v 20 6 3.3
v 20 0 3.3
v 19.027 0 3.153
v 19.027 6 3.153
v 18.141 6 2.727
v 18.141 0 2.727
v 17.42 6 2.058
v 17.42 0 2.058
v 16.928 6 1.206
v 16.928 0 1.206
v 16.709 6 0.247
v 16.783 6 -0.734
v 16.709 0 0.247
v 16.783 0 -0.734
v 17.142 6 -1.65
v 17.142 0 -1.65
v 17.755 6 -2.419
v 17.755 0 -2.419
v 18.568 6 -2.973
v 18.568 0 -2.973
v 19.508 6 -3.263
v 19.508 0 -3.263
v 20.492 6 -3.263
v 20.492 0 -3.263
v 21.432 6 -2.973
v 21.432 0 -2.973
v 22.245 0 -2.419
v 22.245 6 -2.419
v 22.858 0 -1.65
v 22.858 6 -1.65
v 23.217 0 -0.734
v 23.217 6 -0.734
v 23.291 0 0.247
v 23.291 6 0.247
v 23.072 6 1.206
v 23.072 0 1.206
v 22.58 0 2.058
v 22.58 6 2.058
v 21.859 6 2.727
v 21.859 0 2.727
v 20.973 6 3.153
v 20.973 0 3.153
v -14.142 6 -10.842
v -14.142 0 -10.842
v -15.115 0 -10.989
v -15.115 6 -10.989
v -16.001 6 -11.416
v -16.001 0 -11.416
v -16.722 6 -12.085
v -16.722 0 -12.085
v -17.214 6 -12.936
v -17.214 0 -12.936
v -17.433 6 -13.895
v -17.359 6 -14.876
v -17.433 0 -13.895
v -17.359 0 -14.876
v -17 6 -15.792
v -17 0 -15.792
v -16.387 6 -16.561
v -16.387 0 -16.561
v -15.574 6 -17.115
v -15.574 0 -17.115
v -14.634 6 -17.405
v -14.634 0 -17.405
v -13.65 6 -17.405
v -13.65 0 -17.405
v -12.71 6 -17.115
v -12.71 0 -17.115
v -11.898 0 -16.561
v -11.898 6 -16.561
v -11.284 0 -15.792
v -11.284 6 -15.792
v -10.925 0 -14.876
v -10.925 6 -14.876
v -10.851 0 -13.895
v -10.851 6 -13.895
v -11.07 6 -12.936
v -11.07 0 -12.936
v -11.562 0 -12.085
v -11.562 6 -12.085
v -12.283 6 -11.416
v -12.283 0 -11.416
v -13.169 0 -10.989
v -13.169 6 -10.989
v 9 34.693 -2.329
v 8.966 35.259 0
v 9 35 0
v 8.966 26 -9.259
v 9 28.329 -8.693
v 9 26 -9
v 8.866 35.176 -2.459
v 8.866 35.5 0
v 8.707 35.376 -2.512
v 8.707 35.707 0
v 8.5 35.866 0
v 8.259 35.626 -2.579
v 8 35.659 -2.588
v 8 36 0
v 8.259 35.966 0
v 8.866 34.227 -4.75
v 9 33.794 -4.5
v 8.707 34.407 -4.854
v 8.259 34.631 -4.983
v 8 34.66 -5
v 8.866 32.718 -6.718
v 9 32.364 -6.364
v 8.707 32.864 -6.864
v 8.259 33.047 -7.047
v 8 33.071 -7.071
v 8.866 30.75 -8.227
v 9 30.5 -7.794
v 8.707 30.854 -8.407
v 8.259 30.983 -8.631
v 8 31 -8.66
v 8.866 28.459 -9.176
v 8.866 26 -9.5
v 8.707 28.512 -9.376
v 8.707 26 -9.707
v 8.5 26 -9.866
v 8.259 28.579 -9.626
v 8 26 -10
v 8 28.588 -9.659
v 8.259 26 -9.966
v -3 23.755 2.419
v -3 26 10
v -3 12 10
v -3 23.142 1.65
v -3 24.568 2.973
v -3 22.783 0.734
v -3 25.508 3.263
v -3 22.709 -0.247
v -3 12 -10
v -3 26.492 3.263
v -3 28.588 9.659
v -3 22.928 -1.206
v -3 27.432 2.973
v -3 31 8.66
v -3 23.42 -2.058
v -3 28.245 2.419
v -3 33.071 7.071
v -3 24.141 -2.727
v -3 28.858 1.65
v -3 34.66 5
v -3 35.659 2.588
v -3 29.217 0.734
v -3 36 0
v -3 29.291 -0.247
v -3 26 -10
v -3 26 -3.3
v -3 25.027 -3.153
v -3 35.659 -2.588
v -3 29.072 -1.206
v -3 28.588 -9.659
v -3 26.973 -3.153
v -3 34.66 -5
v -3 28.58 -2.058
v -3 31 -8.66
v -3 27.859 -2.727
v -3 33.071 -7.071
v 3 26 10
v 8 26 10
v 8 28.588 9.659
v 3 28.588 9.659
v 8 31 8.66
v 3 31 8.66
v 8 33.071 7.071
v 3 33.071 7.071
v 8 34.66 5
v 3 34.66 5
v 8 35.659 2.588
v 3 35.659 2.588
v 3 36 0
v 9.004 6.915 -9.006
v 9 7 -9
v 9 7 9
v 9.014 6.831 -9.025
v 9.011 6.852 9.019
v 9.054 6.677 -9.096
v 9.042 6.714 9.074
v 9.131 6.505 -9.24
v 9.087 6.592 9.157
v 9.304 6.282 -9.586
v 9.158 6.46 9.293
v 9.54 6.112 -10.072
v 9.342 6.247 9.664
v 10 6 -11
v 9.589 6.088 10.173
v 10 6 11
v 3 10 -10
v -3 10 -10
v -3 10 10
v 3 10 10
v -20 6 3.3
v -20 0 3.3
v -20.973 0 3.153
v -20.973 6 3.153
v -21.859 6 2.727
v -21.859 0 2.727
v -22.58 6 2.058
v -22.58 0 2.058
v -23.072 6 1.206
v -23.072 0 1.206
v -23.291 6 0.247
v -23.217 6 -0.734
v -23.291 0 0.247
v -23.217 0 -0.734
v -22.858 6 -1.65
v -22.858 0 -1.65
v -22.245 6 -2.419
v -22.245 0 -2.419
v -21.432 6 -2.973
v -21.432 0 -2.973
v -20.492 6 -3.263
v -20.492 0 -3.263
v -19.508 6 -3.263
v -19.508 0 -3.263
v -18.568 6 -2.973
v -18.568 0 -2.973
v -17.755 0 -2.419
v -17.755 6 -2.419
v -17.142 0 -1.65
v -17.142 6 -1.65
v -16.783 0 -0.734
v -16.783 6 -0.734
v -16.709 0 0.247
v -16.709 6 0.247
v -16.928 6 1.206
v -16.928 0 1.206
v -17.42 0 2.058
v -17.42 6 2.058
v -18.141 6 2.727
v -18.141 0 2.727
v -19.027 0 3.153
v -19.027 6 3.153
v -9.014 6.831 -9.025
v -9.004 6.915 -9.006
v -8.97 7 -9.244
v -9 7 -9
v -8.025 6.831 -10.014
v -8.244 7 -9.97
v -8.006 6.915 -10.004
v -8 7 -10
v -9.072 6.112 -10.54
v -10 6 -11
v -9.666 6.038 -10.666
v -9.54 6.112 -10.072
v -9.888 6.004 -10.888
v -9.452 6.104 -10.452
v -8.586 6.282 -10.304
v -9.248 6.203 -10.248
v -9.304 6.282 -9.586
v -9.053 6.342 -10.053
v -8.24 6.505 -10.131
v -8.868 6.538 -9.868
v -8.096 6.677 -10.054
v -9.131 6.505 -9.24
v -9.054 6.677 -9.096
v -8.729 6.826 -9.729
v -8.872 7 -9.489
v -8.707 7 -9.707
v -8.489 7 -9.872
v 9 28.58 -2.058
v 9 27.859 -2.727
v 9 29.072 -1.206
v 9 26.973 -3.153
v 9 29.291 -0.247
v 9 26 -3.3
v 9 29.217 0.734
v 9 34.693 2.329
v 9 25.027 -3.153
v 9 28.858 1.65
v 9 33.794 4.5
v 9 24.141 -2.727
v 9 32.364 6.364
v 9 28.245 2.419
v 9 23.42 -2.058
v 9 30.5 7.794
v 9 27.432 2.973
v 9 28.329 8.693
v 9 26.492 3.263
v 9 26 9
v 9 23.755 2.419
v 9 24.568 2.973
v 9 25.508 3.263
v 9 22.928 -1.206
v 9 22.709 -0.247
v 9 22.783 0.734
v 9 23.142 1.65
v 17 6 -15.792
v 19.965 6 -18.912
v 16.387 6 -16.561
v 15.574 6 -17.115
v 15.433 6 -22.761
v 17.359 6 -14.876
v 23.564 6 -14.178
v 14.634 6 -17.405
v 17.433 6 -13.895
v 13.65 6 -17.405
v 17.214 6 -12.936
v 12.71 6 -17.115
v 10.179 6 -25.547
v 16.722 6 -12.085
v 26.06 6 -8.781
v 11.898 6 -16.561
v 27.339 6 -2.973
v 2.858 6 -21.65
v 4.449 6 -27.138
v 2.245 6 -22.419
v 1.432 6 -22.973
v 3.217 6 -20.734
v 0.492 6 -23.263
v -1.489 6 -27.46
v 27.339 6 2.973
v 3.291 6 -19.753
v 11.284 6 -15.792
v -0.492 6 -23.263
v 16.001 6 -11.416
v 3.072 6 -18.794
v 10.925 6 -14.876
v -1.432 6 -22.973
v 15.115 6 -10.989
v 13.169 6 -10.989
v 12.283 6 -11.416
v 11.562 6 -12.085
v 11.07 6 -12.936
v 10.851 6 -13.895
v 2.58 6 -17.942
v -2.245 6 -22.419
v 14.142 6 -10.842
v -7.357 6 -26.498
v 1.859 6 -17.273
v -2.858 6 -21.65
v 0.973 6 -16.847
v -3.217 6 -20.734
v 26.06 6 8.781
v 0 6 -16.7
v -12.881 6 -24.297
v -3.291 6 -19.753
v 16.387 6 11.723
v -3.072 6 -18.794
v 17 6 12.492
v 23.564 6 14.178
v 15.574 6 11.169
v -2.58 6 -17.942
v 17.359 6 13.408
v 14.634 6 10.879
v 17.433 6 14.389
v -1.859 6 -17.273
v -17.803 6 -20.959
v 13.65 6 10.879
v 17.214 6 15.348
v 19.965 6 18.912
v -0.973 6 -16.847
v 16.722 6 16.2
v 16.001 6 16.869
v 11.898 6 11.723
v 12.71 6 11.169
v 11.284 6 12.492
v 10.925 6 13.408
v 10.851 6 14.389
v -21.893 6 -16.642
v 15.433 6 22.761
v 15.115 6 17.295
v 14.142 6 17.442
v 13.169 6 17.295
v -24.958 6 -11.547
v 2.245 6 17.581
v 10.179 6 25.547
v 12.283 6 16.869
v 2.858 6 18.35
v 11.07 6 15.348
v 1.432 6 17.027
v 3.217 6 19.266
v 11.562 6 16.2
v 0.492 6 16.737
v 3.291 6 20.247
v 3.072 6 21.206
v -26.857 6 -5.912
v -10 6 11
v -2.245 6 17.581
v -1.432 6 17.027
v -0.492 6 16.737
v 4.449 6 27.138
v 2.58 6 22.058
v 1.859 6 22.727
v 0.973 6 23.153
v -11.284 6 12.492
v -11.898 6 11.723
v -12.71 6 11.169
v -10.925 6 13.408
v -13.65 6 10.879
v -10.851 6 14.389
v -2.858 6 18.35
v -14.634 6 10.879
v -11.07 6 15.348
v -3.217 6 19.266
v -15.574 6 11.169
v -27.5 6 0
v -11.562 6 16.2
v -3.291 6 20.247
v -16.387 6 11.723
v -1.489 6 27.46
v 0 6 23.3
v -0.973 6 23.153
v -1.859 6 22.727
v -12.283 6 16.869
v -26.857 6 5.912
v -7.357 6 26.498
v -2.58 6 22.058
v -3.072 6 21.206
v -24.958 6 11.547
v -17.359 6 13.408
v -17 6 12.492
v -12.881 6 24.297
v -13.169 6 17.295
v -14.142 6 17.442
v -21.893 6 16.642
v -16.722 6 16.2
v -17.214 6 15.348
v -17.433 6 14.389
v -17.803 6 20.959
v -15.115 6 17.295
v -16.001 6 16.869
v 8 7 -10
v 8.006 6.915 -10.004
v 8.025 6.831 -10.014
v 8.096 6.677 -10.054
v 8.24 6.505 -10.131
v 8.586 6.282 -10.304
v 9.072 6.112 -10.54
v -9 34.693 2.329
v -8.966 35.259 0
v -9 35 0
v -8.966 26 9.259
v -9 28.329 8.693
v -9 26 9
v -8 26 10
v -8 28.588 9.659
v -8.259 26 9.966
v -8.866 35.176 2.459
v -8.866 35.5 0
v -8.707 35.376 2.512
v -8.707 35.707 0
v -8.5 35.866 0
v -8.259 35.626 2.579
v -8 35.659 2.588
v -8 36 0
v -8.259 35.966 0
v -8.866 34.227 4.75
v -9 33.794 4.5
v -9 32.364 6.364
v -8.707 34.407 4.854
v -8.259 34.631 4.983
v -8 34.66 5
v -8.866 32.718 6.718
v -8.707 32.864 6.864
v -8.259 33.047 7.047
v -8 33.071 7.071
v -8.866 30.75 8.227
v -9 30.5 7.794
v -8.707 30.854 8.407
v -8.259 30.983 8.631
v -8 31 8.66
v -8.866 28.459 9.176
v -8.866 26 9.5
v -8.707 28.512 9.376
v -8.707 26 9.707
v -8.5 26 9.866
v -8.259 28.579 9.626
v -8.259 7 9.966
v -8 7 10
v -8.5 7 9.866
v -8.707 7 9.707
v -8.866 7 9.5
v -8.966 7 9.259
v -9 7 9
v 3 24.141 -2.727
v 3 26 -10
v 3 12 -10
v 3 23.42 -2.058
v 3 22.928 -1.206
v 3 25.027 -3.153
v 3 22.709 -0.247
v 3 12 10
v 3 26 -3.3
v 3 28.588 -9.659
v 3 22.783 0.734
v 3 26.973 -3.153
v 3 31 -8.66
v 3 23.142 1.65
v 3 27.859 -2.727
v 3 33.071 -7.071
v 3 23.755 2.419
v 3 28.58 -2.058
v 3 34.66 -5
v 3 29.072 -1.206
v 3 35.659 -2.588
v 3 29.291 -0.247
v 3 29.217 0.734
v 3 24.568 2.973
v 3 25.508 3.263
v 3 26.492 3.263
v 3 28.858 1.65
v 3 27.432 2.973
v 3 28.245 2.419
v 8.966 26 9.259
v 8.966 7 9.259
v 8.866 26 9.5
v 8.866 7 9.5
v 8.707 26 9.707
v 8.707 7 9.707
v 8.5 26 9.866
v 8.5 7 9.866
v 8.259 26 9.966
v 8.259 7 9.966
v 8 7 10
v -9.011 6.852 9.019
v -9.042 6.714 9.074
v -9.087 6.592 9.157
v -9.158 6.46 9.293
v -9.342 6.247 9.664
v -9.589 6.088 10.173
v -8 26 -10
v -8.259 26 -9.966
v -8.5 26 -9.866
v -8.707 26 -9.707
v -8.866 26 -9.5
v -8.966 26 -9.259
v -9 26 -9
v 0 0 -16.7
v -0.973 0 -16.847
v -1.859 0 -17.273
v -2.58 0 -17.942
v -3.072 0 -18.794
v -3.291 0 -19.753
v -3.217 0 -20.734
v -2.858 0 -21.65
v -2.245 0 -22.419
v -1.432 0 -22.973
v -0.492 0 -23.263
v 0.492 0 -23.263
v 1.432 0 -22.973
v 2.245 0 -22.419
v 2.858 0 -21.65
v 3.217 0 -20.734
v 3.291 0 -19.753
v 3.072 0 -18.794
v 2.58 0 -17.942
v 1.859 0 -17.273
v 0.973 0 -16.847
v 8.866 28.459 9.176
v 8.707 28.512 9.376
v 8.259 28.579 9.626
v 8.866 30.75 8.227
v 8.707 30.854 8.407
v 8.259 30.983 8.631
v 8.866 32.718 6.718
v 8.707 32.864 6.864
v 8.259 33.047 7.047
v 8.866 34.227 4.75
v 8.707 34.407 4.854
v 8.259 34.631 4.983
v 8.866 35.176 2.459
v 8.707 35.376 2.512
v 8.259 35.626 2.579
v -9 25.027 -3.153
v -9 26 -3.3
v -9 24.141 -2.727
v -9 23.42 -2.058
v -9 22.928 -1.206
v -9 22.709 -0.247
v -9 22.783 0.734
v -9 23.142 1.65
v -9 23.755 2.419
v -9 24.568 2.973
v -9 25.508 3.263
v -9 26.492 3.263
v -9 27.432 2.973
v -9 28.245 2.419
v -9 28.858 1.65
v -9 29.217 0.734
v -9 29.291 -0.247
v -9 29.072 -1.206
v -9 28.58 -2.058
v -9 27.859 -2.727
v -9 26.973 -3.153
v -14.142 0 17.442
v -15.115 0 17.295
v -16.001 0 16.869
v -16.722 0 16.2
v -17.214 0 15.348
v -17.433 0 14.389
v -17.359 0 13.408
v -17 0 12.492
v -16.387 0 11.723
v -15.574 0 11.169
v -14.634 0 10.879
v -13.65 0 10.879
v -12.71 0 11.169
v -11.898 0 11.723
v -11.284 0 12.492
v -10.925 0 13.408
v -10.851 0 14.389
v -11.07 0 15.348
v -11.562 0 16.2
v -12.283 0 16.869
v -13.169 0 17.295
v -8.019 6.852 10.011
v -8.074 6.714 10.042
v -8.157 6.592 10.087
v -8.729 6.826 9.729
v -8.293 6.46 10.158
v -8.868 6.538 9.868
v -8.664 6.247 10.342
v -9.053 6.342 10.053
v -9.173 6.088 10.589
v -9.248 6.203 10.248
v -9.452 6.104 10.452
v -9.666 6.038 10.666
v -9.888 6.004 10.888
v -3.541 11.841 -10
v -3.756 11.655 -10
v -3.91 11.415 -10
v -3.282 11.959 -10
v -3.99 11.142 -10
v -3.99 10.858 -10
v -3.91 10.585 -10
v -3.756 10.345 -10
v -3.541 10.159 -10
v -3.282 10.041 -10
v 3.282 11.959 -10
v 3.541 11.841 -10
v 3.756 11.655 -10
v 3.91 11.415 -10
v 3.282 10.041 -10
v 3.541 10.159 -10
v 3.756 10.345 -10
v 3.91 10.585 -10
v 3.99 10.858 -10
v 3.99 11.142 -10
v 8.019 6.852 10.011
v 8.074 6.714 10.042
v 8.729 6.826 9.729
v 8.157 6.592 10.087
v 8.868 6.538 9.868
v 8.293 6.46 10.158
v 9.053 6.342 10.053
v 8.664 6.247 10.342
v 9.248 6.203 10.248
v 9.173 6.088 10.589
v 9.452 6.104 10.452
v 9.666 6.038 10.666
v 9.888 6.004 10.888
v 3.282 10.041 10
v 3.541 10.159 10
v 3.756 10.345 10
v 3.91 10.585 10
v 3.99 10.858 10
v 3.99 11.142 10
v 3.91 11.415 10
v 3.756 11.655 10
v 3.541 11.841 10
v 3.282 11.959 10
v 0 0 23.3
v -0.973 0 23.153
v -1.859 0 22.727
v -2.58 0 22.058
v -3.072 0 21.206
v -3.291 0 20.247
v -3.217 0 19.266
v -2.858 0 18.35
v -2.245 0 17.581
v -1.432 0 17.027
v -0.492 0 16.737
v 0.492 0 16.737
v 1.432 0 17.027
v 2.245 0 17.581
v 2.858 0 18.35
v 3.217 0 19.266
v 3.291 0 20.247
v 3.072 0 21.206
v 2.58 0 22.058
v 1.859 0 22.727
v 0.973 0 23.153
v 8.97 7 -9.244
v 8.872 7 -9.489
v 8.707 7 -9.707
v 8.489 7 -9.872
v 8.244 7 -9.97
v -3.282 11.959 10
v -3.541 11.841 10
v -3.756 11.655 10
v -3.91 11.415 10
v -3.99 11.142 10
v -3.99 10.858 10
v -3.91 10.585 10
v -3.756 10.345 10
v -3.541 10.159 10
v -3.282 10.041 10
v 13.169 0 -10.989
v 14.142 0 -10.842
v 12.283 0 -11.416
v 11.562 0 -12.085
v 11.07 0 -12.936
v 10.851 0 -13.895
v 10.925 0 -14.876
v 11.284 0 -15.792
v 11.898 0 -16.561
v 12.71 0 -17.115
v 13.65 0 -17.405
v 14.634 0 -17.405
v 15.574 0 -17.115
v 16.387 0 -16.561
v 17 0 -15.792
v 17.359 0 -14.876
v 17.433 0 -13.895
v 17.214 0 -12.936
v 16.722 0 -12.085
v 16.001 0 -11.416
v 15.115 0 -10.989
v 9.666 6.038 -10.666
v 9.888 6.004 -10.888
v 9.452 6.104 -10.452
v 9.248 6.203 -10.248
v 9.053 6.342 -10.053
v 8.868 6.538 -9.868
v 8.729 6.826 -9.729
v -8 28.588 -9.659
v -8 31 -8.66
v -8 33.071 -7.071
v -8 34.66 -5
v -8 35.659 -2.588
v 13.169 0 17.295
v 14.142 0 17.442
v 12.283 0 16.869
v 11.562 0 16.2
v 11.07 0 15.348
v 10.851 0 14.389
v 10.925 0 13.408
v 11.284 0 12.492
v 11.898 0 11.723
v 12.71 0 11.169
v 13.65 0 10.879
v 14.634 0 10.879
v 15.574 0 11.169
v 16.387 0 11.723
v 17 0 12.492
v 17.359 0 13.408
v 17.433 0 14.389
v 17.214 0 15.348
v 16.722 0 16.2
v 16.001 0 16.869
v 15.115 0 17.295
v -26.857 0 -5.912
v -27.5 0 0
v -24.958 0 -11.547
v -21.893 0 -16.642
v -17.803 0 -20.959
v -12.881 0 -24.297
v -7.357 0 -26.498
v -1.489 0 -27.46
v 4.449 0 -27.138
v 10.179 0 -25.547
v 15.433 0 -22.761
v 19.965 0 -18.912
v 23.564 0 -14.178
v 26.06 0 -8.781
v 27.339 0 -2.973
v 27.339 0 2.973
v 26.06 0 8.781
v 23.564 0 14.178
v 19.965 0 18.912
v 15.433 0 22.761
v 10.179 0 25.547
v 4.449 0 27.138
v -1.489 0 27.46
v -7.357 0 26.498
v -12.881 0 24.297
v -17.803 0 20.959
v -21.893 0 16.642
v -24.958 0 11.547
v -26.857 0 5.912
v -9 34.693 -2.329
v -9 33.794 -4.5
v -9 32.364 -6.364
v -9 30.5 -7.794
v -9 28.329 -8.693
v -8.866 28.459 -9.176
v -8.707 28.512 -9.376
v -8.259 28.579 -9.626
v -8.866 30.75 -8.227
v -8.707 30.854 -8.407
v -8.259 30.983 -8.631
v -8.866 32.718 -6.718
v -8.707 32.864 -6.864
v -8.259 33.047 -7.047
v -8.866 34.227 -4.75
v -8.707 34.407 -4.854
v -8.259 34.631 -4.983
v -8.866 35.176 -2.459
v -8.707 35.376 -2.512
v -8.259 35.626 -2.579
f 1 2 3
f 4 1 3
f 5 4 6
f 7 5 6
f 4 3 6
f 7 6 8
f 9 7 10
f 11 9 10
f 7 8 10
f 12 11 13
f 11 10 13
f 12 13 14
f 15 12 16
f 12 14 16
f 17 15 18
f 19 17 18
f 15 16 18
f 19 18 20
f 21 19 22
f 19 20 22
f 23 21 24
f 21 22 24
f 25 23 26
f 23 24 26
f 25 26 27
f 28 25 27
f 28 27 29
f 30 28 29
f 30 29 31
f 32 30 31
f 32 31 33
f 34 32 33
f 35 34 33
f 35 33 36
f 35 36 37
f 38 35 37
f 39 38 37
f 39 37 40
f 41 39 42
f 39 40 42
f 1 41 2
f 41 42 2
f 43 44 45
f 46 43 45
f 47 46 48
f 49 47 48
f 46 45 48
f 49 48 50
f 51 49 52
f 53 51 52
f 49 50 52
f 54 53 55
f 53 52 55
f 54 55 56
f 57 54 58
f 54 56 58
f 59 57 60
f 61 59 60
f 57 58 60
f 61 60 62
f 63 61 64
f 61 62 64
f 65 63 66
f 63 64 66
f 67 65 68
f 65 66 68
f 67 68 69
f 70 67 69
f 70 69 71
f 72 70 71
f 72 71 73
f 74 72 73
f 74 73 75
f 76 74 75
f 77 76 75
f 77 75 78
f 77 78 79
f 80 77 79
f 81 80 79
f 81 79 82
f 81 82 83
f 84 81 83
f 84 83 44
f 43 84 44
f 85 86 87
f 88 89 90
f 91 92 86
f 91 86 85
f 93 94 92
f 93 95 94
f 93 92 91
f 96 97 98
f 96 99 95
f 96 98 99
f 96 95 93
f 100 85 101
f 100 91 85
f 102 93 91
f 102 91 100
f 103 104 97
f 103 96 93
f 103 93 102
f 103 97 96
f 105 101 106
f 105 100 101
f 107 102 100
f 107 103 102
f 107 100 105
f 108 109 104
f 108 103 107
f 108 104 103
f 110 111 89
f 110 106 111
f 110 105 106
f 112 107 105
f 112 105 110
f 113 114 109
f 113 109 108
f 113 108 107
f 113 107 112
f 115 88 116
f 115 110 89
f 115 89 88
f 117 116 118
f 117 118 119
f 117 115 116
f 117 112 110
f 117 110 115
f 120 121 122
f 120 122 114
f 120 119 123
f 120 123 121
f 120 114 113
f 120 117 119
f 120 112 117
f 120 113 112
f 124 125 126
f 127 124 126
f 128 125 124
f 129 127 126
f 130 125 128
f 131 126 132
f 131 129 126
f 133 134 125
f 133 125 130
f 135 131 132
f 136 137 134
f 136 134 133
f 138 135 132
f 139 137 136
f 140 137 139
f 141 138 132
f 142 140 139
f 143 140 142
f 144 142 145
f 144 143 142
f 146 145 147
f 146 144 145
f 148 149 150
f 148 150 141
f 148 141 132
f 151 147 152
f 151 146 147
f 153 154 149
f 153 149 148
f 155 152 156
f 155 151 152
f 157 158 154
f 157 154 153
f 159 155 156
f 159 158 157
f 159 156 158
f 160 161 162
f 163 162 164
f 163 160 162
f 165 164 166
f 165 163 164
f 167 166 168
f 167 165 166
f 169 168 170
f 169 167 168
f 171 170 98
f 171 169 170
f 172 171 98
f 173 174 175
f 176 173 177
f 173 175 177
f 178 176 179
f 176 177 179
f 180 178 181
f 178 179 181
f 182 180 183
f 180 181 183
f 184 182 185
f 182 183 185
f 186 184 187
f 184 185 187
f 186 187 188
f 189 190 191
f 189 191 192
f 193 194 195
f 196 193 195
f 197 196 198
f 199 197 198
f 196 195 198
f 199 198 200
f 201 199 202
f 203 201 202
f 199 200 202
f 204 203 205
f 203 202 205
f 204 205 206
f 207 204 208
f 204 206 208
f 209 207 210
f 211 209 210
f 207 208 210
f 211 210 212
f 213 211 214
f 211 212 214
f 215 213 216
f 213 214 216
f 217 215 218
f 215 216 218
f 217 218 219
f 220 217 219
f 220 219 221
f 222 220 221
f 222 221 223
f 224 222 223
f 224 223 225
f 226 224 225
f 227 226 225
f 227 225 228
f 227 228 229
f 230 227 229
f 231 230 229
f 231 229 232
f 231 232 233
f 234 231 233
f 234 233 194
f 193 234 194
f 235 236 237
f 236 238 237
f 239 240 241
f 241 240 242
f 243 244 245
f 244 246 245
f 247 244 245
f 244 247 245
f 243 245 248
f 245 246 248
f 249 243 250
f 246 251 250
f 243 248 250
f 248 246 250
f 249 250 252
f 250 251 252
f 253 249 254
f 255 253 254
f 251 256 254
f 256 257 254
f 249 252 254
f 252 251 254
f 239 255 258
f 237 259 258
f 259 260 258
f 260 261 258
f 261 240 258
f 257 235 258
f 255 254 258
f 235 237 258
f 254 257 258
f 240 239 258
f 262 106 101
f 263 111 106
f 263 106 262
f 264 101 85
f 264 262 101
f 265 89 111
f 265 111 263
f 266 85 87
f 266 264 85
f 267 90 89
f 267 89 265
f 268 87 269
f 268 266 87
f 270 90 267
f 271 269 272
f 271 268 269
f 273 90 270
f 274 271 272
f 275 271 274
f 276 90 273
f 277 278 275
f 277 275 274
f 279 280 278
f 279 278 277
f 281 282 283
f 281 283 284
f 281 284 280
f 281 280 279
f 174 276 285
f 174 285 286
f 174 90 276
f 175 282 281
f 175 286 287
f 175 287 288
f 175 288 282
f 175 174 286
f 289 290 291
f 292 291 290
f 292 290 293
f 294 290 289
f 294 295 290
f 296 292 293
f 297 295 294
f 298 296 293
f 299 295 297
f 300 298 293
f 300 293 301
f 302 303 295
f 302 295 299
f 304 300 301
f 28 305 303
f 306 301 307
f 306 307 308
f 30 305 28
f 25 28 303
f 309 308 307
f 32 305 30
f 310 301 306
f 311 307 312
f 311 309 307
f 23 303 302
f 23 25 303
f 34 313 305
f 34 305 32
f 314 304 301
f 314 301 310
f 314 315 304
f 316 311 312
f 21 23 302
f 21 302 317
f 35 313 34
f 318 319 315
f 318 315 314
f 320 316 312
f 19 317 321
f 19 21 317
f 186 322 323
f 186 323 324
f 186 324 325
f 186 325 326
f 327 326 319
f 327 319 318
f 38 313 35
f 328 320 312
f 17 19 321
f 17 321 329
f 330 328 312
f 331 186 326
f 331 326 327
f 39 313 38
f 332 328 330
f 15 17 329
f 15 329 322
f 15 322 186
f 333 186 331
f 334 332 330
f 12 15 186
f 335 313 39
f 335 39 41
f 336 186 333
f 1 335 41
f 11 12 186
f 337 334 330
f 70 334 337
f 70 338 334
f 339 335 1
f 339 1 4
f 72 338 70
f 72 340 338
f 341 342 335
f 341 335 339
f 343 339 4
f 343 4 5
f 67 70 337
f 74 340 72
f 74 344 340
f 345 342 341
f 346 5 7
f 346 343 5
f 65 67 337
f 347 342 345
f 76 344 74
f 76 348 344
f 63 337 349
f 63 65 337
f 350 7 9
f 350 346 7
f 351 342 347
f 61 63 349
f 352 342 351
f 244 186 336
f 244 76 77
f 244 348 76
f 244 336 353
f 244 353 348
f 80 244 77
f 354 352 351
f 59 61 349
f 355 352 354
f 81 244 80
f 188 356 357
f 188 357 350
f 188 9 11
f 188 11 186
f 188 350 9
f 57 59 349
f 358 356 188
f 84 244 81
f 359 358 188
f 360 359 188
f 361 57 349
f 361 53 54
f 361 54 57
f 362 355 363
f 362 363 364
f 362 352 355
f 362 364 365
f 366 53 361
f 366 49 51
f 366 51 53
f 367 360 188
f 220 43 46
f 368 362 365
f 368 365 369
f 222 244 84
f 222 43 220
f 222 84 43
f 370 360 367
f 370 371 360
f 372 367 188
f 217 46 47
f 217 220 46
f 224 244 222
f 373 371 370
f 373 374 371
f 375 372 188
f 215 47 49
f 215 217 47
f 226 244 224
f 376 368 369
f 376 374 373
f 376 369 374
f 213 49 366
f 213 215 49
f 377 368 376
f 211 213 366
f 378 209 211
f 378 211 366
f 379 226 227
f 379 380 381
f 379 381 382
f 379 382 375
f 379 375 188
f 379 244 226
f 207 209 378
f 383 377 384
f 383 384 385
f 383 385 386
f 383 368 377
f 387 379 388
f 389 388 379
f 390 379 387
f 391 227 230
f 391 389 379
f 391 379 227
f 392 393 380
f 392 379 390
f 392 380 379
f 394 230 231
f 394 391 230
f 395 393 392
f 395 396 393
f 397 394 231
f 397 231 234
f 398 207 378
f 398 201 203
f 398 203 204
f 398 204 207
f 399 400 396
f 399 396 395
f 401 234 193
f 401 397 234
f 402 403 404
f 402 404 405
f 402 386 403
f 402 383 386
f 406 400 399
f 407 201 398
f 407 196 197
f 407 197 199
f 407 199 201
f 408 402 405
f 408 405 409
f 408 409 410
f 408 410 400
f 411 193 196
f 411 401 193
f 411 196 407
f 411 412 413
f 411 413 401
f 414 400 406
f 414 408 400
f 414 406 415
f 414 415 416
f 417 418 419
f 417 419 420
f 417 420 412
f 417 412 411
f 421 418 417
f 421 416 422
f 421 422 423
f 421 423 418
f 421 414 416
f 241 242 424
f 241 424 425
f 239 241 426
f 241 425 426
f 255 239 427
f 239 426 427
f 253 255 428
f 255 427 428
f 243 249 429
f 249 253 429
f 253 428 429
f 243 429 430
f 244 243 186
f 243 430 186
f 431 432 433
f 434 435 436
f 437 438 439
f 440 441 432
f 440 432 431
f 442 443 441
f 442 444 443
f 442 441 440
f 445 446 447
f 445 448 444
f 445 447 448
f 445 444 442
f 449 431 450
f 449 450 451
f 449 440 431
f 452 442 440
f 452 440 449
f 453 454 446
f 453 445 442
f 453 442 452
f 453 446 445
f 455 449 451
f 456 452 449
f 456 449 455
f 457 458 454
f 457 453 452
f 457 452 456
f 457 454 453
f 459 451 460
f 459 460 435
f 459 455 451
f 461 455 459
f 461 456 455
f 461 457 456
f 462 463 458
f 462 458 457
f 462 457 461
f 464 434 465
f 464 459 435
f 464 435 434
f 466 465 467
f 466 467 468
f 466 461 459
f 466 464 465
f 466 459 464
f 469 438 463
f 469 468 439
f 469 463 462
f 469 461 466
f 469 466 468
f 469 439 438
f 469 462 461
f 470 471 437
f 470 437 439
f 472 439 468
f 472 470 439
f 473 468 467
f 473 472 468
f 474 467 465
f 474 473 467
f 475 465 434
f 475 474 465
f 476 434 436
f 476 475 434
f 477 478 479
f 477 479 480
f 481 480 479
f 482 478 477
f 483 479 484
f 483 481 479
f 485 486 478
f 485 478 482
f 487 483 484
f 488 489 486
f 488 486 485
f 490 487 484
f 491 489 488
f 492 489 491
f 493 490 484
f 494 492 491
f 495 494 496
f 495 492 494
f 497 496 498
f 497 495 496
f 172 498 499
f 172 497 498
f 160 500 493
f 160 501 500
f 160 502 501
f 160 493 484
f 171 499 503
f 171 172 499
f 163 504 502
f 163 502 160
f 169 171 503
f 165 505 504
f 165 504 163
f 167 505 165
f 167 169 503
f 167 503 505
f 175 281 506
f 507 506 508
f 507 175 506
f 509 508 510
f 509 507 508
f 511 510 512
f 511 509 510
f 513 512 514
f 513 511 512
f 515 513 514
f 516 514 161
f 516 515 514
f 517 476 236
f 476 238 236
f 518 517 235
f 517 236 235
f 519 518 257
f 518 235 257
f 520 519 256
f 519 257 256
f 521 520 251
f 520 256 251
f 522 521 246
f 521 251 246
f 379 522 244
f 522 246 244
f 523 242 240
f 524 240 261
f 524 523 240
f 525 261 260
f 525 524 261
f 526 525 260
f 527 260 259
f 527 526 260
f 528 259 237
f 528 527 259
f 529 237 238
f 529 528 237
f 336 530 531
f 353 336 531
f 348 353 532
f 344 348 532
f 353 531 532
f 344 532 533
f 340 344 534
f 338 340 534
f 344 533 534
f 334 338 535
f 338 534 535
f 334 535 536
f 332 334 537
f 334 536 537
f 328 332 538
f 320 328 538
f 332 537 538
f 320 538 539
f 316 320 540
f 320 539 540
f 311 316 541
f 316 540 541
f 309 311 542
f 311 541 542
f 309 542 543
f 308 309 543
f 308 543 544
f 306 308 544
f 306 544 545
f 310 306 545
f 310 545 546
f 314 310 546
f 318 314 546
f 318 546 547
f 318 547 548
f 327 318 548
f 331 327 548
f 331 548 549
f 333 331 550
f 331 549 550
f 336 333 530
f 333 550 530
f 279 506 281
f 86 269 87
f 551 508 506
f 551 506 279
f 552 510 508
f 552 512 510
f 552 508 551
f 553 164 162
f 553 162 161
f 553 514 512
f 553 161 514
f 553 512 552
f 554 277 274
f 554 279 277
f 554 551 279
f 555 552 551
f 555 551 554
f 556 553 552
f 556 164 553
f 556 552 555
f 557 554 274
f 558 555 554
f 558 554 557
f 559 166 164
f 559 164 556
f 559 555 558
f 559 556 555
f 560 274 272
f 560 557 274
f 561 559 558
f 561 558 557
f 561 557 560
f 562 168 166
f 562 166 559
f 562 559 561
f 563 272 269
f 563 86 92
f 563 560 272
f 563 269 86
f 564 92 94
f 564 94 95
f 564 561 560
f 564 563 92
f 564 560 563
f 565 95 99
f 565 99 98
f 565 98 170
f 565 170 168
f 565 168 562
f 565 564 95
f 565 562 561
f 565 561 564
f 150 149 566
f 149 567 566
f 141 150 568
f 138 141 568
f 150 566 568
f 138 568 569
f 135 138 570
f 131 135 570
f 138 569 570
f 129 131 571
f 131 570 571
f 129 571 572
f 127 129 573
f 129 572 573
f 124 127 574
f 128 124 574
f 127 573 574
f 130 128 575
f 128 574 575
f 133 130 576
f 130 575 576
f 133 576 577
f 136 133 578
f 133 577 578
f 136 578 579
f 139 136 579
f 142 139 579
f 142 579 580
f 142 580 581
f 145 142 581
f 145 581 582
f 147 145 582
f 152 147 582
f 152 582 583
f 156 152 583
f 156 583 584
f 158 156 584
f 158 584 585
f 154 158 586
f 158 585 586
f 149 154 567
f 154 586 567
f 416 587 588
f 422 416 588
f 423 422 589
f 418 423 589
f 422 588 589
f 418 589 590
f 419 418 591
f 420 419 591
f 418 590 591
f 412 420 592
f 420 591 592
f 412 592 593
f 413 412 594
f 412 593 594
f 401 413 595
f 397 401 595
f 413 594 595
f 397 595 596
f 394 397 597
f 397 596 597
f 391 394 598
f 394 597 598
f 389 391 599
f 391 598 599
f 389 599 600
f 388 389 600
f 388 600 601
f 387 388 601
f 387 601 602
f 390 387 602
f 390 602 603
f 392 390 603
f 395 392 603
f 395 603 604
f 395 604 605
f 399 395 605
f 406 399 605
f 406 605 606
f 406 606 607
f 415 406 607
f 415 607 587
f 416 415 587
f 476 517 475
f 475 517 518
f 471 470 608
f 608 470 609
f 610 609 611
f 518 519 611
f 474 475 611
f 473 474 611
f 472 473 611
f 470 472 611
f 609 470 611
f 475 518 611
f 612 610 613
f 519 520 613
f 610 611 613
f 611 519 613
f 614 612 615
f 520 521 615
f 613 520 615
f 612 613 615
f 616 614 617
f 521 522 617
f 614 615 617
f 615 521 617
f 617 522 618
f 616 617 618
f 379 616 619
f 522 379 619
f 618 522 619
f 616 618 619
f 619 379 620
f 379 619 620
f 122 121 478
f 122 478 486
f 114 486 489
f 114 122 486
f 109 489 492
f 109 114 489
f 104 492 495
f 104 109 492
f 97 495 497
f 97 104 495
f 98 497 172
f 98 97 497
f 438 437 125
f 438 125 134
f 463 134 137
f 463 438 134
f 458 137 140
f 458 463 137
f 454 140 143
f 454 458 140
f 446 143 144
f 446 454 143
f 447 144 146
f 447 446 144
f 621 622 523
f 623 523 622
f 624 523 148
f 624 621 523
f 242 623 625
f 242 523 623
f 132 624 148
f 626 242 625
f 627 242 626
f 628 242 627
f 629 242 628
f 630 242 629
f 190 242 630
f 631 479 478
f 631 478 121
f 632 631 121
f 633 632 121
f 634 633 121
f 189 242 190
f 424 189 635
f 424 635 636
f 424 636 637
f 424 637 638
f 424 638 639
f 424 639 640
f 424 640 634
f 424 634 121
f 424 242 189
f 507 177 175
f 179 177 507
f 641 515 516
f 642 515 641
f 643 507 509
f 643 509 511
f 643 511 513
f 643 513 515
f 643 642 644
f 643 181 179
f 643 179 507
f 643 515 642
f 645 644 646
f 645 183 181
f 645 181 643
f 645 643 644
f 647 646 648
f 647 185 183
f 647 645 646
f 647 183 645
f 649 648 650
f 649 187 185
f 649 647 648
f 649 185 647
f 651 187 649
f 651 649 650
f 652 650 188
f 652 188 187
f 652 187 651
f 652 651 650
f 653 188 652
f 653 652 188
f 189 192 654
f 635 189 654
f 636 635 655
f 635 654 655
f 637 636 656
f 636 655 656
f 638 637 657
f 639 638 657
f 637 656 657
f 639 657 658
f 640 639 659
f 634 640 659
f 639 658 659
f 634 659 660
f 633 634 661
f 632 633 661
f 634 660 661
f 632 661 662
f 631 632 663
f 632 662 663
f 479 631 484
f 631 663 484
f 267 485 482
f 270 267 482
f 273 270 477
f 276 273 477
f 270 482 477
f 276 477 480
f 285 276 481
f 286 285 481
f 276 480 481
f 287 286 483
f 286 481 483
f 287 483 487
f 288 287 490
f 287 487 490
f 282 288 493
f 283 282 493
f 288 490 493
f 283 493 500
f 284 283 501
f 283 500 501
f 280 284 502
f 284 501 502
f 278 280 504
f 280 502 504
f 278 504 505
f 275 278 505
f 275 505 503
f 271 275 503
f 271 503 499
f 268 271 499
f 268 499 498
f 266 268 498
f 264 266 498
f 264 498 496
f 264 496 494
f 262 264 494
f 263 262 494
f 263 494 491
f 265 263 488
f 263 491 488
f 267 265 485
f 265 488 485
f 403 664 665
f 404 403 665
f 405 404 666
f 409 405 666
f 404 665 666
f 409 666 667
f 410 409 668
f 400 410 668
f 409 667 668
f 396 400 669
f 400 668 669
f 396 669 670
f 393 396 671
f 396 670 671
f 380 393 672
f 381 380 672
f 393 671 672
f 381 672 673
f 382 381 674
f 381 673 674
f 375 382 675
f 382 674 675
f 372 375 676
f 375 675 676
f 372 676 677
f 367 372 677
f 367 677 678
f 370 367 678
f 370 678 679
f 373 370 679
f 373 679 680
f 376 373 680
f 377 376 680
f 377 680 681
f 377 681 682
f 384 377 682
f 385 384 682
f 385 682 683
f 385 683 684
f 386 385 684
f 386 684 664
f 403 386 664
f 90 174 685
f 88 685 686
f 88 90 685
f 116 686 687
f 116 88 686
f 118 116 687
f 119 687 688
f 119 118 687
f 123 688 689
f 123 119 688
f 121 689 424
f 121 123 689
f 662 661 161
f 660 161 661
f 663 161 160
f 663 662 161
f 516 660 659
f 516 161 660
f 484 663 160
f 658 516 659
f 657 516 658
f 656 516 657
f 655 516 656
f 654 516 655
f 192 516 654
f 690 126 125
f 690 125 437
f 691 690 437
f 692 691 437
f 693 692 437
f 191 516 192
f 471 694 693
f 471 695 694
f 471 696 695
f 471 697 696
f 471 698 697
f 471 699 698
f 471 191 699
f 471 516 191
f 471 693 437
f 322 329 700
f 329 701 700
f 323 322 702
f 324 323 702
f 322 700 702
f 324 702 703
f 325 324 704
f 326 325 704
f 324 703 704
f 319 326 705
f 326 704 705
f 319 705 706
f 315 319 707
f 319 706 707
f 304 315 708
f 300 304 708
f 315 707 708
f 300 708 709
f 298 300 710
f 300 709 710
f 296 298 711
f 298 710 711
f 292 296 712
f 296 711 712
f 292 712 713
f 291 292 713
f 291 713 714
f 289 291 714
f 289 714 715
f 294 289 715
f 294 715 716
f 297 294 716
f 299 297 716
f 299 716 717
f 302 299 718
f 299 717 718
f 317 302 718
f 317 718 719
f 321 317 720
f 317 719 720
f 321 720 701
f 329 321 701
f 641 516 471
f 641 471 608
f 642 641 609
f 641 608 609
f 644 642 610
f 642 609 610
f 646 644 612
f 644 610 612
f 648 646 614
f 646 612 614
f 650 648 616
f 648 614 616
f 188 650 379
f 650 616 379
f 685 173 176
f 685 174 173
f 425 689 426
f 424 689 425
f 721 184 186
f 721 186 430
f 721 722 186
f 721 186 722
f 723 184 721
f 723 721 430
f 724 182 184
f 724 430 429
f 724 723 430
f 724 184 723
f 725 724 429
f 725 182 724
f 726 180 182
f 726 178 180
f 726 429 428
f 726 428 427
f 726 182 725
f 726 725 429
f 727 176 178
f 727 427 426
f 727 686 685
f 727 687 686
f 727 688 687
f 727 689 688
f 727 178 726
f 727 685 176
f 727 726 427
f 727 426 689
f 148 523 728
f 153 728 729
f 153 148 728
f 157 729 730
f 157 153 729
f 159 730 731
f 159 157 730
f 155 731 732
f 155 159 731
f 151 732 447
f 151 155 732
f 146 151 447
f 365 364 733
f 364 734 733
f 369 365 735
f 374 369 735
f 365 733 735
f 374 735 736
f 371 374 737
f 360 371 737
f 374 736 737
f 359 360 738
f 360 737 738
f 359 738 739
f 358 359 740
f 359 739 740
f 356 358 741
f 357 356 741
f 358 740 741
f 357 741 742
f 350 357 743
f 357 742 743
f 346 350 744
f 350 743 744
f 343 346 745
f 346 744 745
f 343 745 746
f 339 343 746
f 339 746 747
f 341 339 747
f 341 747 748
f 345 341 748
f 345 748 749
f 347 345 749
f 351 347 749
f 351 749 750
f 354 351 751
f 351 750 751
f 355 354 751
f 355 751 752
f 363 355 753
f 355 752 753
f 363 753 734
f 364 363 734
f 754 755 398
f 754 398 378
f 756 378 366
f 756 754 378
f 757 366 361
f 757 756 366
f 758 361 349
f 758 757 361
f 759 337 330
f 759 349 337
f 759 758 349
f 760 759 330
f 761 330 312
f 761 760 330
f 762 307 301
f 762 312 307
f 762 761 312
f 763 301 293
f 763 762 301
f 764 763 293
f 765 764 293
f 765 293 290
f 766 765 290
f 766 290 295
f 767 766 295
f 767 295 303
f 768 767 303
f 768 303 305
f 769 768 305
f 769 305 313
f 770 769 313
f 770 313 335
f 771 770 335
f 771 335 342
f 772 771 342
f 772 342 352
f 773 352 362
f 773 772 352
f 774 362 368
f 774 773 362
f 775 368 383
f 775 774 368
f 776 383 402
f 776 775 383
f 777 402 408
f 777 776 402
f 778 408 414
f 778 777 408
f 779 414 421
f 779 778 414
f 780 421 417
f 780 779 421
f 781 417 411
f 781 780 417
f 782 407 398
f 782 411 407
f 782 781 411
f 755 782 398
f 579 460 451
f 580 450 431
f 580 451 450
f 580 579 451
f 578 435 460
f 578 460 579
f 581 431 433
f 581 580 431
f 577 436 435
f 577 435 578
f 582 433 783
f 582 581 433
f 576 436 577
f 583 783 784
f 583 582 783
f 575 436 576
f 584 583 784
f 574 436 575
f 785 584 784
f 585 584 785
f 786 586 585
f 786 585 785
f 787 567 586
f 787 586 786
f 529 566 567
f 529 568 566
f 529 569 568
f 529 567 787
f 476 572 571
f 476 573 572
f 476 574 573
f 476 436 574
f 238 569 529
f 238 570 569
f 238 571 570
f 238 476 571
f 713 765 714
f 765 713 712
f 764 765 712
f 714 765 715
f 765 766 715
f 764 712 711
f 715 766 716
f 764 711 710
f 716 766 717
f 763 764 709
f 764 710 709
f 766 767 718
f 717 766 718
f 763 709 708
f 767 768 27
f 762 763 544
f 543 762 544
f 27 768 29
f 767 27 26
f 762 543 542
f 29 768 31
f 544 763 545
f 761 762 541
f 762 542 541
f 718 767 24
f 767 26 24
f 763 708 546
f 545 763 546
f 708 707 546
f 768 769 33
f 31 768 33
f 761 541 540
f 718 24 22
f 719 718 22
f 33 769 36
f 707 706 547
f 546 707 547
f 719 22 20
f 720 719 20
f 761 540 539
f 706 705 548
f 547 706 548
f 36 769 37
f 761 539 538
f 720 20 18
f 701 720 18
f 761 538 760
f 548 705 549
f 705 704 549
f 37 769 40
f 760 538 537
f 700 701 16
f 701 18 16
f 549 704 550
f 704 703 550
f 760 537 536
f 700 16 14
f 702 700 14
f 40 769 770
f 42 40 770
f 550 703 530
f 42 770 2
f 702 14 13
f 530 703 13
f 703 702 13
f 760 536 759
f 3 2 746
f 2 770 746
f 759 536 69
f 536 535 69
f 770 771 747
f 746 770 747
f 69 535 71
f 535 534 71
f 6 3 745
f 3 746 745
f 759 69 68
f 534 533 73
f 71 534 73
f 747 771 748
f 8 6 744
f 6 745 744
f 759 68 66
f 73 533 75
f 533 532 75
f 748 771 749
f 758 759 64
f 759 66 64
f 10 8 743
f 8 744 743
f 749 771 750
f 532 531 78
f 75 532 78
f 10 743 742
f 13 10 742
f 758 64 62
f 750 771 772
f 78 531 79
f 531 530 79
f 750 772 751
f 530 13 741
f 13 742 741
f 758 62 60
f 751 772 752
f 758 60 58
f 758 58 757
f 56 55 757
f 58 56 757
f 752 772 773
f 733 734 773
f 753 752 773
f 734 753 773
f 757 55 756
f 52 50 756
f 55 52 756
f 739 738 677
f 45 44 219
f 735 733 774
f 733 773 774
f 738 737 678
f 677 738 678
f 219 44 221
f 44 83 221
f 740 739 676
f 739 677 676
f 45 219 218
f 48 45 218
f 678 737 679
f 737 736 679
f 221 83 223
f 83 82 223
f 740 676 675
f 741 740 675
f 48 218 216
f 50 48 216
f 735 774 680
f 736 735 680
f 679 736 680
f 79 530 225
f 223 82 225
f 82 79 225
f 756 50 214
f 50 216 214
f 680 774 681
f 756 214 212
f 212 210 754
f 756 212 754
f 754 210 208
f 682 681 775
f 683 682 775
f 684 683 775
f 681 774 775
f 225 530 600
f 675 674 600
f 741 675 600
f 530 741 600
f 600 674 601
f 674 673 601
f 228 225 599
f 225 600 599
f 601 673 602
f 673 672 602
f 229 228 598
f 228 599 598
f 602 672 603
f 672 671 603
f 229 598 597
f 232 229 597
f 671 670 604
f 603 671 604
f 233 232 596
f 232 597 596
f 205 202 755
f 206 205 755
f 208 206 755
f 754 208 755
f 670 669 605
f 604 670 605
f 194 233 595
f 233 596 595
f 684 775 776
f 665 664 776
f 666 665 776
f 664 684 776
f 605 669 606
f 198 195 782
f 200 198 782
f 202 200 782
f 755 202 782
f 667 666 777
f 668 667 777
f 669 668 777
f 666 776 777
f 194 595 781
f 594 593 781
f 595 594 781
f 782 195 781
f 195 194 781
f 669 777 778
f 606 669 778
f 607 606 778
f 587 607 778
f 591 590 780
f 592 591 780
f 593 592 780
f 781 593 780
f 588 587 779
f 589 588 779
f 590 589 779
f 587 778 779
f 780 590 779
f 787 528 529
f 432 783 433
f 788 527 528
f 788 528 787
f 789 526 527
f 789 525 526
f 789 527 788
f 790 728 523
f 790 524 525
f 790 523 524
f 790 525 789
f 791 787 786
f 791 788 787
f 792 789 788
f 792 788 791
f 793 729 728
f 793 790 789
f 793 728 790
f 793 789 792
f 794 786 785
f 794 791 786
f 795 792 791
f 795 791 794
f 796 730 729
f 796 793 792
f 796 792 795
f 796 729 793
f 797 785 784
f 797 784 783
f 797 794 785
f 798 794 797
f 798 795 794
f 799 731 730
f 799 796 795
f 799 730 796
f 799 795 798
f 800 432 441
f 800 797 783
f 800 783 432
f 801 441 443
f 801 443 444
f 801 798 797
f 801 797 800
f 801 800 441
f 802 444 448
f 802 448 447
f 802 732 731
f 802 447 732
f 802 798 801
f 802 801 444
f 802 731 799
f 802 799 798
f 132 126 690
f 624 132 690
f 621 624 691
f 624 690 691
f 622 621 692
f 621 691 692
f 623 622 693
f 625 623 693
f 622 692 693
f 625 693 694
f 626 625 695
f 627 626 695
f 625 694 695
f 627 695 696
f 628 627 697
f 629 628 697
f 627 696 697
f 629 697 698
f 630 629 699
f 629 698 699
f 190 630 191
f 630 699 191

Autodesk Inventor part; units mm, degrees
ref_plane "YZ Plane" through (0, 0, 0) normal (1, 0, 0) x (0, 1, 0)
ref_plane "XZ Plane" through (0, 0, 0) normal (0, 1, 0) x (-1, 0, 0)
ref_plane "XY Plane" through (0, 0, 0) normal (0, 0, 1) x (1, 0, 0)
sketch "Sketch1" plane through (0, 0, 0) normal (0, 1, 0) x (-1, 0, 0)
  circle A0 centre (0, 0) radius 27.5
  dimension "d0" = 55
extrude "Extrusion1" add sketch "Sketch1" along normal blind 6
sketch "Sketch2" plane through (0, 6, 0) normal (0, 1, 0) x (1, 0, 0)
  circle A0 centre (0, 0) radius 27.5 projected
  point P0 (20, 0)
  point P1 (14.1421, 14.1421)
  point P2 (0, 20)
  point P3 (-14.1421, 14.1421)
  point P4 (-20, 0)
  point P5 (-14.1421, -14.1421)
  point P6 (0, -20)
  point P7 (14.1421, -14.1421)
  dimension "d3" = 20
  dimension "d6" = 360
hole "Hole1" at (20, 6, 0) at (14.1421, 6, -14.1421) at (0, 6, -20) at (-14.1421, 6, -14.1421) at (-20, 6, 0) at (-14.1421, 6, 14.1421) at (0, 6, 20) at (14.1421, 6, 14.1421) direction (0, -1, 0) diameter 6.6 depth 8 tip angle 118 clearance for "Flat Head Machine Screw" size "M6" standard "Ansi Metric M Profile"
sketch "Sketch8" plane through (0, 6, 0) normal (0, 1, 0) x (1, 0, 0)
  circle A0 centre (0, 0) radius 27.5 projected
  line L0 (-9, 10) -> (9, 10)
  line L1 (9, 10) -> (9, -10)
  line L2 (9, -10) -> (-9, -10)
  line L3 (-9, -10) -> (-9, 10)
  point P0 (0, 10)
  point P1 (9, 0)
  dimension "d28" = 18
  dimension "d30" = 20
extrude "Extrusion3" add sketch "Sketch8" along normal blind 30 contours L0 L1 L2 L3
sketch "Sketch9" plane through (0, 36, 0) normal (0, 1, 0) x (1, 0, 0)
  line L0 (9, 10) -> (-9, 10) projected
  line L1 (-9, -10) -> (9, -10) projected
  line L2 (-3, 10) -> (3, 10)
  line L3 (3, 10) -> (3, -10)
  line L4 (3, -10) -> (-3, -10)
  line L5 (-3, -10) -> (-3, 10)
  point P0 (0, 0)
  point P1 (0, 10)
  point P2 (0, 10)
  dimension "d54" = 6
sketch "Sketch10" plane through (9, 6, 10) normal (1, 0, 0) x (0, 0, -1)
  line L0 (20, 0) -> (0, 0) projected
  line L1 (20, 0) -> (20, 30) projected
  line L2 (0, 30) -> (20, 30) projected
  line L3 (0, 0) -> (0, 30) projected
  point P0 (10, -6)
fillet "Fillet2" radius 10 2 edges at (0, 36, 10) (0, 36, -10)
sketch "Sketch11" plane through (9, 6, 10) normal (1, 0, 0) x (0, 0, -1)
  arc A0 (20, 20) -> (0, 20) centre (10, 20) ccw projected
  point P0 (10, -6)
hole "Hole3" at (9, 26, 0) direction (-1, 0, 0) diameter 6.6 end through all clearance for "Flat Head Machine Screw" size "M6" standard "Ansi Metric M Profile"
extrude "Extrusion4" cut sketch "Sketch9" against normal blind 25
sketch "Sketch12" plane through (-9, 6, 10) normal (0, 0, 1) x (1, 0, 0)
  line L0 (6, 5) -> (6, 20) projected
  line L1 (12, 20) -> (12, 5) projected
  line L2 (12, 5) -> (6, 5) projected
  arc A0 (6, 6) -> (6, 4) centre (6, 5) ccw
  line L3 (6, 5) -> (6, 4) construction
  line L4 (6, 5) -> (6, 6) construction
  arc A1 (12, 4) -> (12, 6) centre (12, 5) ccw
  line L5 (12, 5) -> (12, 4) construction
  line L6 (12, 5) -> (12, 6) construction
  line L7 (6, 6) -> (12, 6)
  line L8 (6, 4) -> (12, 4)
  point P0 (9, -6)
  dimension "d45" = 1
  dimension "d46" = 180
  dimension "d47" = 1
  dimension "d48" = 180
extrude "Extrusion5" cut sketch "Sketch12" against normal through all contours L2 L1 A1 L8 A0 L0
fillet "Fillet3" radius 1 4 edges at (0, 6, 10) (-9, 6, 0) (9, 6, 0) (0, 6, -10)
fillet "Fillet4" radius 1 10 edges at (9, 33.0711, -7.0711) (9, 16.5001, -10) (9.2929, 6.2929, -10.2929) (9.2929, 6.2929, 10.2929) (9, 16.5001, 10) (-9, 33.0711, -7.0711) (-9, 16.5001, 10) (-9.2929, 6.2929, 10.2929) (-9.2929, 6.2929, -10.2929) (-9, 16.5001, -10)
properties part number "right_angle_holder"
